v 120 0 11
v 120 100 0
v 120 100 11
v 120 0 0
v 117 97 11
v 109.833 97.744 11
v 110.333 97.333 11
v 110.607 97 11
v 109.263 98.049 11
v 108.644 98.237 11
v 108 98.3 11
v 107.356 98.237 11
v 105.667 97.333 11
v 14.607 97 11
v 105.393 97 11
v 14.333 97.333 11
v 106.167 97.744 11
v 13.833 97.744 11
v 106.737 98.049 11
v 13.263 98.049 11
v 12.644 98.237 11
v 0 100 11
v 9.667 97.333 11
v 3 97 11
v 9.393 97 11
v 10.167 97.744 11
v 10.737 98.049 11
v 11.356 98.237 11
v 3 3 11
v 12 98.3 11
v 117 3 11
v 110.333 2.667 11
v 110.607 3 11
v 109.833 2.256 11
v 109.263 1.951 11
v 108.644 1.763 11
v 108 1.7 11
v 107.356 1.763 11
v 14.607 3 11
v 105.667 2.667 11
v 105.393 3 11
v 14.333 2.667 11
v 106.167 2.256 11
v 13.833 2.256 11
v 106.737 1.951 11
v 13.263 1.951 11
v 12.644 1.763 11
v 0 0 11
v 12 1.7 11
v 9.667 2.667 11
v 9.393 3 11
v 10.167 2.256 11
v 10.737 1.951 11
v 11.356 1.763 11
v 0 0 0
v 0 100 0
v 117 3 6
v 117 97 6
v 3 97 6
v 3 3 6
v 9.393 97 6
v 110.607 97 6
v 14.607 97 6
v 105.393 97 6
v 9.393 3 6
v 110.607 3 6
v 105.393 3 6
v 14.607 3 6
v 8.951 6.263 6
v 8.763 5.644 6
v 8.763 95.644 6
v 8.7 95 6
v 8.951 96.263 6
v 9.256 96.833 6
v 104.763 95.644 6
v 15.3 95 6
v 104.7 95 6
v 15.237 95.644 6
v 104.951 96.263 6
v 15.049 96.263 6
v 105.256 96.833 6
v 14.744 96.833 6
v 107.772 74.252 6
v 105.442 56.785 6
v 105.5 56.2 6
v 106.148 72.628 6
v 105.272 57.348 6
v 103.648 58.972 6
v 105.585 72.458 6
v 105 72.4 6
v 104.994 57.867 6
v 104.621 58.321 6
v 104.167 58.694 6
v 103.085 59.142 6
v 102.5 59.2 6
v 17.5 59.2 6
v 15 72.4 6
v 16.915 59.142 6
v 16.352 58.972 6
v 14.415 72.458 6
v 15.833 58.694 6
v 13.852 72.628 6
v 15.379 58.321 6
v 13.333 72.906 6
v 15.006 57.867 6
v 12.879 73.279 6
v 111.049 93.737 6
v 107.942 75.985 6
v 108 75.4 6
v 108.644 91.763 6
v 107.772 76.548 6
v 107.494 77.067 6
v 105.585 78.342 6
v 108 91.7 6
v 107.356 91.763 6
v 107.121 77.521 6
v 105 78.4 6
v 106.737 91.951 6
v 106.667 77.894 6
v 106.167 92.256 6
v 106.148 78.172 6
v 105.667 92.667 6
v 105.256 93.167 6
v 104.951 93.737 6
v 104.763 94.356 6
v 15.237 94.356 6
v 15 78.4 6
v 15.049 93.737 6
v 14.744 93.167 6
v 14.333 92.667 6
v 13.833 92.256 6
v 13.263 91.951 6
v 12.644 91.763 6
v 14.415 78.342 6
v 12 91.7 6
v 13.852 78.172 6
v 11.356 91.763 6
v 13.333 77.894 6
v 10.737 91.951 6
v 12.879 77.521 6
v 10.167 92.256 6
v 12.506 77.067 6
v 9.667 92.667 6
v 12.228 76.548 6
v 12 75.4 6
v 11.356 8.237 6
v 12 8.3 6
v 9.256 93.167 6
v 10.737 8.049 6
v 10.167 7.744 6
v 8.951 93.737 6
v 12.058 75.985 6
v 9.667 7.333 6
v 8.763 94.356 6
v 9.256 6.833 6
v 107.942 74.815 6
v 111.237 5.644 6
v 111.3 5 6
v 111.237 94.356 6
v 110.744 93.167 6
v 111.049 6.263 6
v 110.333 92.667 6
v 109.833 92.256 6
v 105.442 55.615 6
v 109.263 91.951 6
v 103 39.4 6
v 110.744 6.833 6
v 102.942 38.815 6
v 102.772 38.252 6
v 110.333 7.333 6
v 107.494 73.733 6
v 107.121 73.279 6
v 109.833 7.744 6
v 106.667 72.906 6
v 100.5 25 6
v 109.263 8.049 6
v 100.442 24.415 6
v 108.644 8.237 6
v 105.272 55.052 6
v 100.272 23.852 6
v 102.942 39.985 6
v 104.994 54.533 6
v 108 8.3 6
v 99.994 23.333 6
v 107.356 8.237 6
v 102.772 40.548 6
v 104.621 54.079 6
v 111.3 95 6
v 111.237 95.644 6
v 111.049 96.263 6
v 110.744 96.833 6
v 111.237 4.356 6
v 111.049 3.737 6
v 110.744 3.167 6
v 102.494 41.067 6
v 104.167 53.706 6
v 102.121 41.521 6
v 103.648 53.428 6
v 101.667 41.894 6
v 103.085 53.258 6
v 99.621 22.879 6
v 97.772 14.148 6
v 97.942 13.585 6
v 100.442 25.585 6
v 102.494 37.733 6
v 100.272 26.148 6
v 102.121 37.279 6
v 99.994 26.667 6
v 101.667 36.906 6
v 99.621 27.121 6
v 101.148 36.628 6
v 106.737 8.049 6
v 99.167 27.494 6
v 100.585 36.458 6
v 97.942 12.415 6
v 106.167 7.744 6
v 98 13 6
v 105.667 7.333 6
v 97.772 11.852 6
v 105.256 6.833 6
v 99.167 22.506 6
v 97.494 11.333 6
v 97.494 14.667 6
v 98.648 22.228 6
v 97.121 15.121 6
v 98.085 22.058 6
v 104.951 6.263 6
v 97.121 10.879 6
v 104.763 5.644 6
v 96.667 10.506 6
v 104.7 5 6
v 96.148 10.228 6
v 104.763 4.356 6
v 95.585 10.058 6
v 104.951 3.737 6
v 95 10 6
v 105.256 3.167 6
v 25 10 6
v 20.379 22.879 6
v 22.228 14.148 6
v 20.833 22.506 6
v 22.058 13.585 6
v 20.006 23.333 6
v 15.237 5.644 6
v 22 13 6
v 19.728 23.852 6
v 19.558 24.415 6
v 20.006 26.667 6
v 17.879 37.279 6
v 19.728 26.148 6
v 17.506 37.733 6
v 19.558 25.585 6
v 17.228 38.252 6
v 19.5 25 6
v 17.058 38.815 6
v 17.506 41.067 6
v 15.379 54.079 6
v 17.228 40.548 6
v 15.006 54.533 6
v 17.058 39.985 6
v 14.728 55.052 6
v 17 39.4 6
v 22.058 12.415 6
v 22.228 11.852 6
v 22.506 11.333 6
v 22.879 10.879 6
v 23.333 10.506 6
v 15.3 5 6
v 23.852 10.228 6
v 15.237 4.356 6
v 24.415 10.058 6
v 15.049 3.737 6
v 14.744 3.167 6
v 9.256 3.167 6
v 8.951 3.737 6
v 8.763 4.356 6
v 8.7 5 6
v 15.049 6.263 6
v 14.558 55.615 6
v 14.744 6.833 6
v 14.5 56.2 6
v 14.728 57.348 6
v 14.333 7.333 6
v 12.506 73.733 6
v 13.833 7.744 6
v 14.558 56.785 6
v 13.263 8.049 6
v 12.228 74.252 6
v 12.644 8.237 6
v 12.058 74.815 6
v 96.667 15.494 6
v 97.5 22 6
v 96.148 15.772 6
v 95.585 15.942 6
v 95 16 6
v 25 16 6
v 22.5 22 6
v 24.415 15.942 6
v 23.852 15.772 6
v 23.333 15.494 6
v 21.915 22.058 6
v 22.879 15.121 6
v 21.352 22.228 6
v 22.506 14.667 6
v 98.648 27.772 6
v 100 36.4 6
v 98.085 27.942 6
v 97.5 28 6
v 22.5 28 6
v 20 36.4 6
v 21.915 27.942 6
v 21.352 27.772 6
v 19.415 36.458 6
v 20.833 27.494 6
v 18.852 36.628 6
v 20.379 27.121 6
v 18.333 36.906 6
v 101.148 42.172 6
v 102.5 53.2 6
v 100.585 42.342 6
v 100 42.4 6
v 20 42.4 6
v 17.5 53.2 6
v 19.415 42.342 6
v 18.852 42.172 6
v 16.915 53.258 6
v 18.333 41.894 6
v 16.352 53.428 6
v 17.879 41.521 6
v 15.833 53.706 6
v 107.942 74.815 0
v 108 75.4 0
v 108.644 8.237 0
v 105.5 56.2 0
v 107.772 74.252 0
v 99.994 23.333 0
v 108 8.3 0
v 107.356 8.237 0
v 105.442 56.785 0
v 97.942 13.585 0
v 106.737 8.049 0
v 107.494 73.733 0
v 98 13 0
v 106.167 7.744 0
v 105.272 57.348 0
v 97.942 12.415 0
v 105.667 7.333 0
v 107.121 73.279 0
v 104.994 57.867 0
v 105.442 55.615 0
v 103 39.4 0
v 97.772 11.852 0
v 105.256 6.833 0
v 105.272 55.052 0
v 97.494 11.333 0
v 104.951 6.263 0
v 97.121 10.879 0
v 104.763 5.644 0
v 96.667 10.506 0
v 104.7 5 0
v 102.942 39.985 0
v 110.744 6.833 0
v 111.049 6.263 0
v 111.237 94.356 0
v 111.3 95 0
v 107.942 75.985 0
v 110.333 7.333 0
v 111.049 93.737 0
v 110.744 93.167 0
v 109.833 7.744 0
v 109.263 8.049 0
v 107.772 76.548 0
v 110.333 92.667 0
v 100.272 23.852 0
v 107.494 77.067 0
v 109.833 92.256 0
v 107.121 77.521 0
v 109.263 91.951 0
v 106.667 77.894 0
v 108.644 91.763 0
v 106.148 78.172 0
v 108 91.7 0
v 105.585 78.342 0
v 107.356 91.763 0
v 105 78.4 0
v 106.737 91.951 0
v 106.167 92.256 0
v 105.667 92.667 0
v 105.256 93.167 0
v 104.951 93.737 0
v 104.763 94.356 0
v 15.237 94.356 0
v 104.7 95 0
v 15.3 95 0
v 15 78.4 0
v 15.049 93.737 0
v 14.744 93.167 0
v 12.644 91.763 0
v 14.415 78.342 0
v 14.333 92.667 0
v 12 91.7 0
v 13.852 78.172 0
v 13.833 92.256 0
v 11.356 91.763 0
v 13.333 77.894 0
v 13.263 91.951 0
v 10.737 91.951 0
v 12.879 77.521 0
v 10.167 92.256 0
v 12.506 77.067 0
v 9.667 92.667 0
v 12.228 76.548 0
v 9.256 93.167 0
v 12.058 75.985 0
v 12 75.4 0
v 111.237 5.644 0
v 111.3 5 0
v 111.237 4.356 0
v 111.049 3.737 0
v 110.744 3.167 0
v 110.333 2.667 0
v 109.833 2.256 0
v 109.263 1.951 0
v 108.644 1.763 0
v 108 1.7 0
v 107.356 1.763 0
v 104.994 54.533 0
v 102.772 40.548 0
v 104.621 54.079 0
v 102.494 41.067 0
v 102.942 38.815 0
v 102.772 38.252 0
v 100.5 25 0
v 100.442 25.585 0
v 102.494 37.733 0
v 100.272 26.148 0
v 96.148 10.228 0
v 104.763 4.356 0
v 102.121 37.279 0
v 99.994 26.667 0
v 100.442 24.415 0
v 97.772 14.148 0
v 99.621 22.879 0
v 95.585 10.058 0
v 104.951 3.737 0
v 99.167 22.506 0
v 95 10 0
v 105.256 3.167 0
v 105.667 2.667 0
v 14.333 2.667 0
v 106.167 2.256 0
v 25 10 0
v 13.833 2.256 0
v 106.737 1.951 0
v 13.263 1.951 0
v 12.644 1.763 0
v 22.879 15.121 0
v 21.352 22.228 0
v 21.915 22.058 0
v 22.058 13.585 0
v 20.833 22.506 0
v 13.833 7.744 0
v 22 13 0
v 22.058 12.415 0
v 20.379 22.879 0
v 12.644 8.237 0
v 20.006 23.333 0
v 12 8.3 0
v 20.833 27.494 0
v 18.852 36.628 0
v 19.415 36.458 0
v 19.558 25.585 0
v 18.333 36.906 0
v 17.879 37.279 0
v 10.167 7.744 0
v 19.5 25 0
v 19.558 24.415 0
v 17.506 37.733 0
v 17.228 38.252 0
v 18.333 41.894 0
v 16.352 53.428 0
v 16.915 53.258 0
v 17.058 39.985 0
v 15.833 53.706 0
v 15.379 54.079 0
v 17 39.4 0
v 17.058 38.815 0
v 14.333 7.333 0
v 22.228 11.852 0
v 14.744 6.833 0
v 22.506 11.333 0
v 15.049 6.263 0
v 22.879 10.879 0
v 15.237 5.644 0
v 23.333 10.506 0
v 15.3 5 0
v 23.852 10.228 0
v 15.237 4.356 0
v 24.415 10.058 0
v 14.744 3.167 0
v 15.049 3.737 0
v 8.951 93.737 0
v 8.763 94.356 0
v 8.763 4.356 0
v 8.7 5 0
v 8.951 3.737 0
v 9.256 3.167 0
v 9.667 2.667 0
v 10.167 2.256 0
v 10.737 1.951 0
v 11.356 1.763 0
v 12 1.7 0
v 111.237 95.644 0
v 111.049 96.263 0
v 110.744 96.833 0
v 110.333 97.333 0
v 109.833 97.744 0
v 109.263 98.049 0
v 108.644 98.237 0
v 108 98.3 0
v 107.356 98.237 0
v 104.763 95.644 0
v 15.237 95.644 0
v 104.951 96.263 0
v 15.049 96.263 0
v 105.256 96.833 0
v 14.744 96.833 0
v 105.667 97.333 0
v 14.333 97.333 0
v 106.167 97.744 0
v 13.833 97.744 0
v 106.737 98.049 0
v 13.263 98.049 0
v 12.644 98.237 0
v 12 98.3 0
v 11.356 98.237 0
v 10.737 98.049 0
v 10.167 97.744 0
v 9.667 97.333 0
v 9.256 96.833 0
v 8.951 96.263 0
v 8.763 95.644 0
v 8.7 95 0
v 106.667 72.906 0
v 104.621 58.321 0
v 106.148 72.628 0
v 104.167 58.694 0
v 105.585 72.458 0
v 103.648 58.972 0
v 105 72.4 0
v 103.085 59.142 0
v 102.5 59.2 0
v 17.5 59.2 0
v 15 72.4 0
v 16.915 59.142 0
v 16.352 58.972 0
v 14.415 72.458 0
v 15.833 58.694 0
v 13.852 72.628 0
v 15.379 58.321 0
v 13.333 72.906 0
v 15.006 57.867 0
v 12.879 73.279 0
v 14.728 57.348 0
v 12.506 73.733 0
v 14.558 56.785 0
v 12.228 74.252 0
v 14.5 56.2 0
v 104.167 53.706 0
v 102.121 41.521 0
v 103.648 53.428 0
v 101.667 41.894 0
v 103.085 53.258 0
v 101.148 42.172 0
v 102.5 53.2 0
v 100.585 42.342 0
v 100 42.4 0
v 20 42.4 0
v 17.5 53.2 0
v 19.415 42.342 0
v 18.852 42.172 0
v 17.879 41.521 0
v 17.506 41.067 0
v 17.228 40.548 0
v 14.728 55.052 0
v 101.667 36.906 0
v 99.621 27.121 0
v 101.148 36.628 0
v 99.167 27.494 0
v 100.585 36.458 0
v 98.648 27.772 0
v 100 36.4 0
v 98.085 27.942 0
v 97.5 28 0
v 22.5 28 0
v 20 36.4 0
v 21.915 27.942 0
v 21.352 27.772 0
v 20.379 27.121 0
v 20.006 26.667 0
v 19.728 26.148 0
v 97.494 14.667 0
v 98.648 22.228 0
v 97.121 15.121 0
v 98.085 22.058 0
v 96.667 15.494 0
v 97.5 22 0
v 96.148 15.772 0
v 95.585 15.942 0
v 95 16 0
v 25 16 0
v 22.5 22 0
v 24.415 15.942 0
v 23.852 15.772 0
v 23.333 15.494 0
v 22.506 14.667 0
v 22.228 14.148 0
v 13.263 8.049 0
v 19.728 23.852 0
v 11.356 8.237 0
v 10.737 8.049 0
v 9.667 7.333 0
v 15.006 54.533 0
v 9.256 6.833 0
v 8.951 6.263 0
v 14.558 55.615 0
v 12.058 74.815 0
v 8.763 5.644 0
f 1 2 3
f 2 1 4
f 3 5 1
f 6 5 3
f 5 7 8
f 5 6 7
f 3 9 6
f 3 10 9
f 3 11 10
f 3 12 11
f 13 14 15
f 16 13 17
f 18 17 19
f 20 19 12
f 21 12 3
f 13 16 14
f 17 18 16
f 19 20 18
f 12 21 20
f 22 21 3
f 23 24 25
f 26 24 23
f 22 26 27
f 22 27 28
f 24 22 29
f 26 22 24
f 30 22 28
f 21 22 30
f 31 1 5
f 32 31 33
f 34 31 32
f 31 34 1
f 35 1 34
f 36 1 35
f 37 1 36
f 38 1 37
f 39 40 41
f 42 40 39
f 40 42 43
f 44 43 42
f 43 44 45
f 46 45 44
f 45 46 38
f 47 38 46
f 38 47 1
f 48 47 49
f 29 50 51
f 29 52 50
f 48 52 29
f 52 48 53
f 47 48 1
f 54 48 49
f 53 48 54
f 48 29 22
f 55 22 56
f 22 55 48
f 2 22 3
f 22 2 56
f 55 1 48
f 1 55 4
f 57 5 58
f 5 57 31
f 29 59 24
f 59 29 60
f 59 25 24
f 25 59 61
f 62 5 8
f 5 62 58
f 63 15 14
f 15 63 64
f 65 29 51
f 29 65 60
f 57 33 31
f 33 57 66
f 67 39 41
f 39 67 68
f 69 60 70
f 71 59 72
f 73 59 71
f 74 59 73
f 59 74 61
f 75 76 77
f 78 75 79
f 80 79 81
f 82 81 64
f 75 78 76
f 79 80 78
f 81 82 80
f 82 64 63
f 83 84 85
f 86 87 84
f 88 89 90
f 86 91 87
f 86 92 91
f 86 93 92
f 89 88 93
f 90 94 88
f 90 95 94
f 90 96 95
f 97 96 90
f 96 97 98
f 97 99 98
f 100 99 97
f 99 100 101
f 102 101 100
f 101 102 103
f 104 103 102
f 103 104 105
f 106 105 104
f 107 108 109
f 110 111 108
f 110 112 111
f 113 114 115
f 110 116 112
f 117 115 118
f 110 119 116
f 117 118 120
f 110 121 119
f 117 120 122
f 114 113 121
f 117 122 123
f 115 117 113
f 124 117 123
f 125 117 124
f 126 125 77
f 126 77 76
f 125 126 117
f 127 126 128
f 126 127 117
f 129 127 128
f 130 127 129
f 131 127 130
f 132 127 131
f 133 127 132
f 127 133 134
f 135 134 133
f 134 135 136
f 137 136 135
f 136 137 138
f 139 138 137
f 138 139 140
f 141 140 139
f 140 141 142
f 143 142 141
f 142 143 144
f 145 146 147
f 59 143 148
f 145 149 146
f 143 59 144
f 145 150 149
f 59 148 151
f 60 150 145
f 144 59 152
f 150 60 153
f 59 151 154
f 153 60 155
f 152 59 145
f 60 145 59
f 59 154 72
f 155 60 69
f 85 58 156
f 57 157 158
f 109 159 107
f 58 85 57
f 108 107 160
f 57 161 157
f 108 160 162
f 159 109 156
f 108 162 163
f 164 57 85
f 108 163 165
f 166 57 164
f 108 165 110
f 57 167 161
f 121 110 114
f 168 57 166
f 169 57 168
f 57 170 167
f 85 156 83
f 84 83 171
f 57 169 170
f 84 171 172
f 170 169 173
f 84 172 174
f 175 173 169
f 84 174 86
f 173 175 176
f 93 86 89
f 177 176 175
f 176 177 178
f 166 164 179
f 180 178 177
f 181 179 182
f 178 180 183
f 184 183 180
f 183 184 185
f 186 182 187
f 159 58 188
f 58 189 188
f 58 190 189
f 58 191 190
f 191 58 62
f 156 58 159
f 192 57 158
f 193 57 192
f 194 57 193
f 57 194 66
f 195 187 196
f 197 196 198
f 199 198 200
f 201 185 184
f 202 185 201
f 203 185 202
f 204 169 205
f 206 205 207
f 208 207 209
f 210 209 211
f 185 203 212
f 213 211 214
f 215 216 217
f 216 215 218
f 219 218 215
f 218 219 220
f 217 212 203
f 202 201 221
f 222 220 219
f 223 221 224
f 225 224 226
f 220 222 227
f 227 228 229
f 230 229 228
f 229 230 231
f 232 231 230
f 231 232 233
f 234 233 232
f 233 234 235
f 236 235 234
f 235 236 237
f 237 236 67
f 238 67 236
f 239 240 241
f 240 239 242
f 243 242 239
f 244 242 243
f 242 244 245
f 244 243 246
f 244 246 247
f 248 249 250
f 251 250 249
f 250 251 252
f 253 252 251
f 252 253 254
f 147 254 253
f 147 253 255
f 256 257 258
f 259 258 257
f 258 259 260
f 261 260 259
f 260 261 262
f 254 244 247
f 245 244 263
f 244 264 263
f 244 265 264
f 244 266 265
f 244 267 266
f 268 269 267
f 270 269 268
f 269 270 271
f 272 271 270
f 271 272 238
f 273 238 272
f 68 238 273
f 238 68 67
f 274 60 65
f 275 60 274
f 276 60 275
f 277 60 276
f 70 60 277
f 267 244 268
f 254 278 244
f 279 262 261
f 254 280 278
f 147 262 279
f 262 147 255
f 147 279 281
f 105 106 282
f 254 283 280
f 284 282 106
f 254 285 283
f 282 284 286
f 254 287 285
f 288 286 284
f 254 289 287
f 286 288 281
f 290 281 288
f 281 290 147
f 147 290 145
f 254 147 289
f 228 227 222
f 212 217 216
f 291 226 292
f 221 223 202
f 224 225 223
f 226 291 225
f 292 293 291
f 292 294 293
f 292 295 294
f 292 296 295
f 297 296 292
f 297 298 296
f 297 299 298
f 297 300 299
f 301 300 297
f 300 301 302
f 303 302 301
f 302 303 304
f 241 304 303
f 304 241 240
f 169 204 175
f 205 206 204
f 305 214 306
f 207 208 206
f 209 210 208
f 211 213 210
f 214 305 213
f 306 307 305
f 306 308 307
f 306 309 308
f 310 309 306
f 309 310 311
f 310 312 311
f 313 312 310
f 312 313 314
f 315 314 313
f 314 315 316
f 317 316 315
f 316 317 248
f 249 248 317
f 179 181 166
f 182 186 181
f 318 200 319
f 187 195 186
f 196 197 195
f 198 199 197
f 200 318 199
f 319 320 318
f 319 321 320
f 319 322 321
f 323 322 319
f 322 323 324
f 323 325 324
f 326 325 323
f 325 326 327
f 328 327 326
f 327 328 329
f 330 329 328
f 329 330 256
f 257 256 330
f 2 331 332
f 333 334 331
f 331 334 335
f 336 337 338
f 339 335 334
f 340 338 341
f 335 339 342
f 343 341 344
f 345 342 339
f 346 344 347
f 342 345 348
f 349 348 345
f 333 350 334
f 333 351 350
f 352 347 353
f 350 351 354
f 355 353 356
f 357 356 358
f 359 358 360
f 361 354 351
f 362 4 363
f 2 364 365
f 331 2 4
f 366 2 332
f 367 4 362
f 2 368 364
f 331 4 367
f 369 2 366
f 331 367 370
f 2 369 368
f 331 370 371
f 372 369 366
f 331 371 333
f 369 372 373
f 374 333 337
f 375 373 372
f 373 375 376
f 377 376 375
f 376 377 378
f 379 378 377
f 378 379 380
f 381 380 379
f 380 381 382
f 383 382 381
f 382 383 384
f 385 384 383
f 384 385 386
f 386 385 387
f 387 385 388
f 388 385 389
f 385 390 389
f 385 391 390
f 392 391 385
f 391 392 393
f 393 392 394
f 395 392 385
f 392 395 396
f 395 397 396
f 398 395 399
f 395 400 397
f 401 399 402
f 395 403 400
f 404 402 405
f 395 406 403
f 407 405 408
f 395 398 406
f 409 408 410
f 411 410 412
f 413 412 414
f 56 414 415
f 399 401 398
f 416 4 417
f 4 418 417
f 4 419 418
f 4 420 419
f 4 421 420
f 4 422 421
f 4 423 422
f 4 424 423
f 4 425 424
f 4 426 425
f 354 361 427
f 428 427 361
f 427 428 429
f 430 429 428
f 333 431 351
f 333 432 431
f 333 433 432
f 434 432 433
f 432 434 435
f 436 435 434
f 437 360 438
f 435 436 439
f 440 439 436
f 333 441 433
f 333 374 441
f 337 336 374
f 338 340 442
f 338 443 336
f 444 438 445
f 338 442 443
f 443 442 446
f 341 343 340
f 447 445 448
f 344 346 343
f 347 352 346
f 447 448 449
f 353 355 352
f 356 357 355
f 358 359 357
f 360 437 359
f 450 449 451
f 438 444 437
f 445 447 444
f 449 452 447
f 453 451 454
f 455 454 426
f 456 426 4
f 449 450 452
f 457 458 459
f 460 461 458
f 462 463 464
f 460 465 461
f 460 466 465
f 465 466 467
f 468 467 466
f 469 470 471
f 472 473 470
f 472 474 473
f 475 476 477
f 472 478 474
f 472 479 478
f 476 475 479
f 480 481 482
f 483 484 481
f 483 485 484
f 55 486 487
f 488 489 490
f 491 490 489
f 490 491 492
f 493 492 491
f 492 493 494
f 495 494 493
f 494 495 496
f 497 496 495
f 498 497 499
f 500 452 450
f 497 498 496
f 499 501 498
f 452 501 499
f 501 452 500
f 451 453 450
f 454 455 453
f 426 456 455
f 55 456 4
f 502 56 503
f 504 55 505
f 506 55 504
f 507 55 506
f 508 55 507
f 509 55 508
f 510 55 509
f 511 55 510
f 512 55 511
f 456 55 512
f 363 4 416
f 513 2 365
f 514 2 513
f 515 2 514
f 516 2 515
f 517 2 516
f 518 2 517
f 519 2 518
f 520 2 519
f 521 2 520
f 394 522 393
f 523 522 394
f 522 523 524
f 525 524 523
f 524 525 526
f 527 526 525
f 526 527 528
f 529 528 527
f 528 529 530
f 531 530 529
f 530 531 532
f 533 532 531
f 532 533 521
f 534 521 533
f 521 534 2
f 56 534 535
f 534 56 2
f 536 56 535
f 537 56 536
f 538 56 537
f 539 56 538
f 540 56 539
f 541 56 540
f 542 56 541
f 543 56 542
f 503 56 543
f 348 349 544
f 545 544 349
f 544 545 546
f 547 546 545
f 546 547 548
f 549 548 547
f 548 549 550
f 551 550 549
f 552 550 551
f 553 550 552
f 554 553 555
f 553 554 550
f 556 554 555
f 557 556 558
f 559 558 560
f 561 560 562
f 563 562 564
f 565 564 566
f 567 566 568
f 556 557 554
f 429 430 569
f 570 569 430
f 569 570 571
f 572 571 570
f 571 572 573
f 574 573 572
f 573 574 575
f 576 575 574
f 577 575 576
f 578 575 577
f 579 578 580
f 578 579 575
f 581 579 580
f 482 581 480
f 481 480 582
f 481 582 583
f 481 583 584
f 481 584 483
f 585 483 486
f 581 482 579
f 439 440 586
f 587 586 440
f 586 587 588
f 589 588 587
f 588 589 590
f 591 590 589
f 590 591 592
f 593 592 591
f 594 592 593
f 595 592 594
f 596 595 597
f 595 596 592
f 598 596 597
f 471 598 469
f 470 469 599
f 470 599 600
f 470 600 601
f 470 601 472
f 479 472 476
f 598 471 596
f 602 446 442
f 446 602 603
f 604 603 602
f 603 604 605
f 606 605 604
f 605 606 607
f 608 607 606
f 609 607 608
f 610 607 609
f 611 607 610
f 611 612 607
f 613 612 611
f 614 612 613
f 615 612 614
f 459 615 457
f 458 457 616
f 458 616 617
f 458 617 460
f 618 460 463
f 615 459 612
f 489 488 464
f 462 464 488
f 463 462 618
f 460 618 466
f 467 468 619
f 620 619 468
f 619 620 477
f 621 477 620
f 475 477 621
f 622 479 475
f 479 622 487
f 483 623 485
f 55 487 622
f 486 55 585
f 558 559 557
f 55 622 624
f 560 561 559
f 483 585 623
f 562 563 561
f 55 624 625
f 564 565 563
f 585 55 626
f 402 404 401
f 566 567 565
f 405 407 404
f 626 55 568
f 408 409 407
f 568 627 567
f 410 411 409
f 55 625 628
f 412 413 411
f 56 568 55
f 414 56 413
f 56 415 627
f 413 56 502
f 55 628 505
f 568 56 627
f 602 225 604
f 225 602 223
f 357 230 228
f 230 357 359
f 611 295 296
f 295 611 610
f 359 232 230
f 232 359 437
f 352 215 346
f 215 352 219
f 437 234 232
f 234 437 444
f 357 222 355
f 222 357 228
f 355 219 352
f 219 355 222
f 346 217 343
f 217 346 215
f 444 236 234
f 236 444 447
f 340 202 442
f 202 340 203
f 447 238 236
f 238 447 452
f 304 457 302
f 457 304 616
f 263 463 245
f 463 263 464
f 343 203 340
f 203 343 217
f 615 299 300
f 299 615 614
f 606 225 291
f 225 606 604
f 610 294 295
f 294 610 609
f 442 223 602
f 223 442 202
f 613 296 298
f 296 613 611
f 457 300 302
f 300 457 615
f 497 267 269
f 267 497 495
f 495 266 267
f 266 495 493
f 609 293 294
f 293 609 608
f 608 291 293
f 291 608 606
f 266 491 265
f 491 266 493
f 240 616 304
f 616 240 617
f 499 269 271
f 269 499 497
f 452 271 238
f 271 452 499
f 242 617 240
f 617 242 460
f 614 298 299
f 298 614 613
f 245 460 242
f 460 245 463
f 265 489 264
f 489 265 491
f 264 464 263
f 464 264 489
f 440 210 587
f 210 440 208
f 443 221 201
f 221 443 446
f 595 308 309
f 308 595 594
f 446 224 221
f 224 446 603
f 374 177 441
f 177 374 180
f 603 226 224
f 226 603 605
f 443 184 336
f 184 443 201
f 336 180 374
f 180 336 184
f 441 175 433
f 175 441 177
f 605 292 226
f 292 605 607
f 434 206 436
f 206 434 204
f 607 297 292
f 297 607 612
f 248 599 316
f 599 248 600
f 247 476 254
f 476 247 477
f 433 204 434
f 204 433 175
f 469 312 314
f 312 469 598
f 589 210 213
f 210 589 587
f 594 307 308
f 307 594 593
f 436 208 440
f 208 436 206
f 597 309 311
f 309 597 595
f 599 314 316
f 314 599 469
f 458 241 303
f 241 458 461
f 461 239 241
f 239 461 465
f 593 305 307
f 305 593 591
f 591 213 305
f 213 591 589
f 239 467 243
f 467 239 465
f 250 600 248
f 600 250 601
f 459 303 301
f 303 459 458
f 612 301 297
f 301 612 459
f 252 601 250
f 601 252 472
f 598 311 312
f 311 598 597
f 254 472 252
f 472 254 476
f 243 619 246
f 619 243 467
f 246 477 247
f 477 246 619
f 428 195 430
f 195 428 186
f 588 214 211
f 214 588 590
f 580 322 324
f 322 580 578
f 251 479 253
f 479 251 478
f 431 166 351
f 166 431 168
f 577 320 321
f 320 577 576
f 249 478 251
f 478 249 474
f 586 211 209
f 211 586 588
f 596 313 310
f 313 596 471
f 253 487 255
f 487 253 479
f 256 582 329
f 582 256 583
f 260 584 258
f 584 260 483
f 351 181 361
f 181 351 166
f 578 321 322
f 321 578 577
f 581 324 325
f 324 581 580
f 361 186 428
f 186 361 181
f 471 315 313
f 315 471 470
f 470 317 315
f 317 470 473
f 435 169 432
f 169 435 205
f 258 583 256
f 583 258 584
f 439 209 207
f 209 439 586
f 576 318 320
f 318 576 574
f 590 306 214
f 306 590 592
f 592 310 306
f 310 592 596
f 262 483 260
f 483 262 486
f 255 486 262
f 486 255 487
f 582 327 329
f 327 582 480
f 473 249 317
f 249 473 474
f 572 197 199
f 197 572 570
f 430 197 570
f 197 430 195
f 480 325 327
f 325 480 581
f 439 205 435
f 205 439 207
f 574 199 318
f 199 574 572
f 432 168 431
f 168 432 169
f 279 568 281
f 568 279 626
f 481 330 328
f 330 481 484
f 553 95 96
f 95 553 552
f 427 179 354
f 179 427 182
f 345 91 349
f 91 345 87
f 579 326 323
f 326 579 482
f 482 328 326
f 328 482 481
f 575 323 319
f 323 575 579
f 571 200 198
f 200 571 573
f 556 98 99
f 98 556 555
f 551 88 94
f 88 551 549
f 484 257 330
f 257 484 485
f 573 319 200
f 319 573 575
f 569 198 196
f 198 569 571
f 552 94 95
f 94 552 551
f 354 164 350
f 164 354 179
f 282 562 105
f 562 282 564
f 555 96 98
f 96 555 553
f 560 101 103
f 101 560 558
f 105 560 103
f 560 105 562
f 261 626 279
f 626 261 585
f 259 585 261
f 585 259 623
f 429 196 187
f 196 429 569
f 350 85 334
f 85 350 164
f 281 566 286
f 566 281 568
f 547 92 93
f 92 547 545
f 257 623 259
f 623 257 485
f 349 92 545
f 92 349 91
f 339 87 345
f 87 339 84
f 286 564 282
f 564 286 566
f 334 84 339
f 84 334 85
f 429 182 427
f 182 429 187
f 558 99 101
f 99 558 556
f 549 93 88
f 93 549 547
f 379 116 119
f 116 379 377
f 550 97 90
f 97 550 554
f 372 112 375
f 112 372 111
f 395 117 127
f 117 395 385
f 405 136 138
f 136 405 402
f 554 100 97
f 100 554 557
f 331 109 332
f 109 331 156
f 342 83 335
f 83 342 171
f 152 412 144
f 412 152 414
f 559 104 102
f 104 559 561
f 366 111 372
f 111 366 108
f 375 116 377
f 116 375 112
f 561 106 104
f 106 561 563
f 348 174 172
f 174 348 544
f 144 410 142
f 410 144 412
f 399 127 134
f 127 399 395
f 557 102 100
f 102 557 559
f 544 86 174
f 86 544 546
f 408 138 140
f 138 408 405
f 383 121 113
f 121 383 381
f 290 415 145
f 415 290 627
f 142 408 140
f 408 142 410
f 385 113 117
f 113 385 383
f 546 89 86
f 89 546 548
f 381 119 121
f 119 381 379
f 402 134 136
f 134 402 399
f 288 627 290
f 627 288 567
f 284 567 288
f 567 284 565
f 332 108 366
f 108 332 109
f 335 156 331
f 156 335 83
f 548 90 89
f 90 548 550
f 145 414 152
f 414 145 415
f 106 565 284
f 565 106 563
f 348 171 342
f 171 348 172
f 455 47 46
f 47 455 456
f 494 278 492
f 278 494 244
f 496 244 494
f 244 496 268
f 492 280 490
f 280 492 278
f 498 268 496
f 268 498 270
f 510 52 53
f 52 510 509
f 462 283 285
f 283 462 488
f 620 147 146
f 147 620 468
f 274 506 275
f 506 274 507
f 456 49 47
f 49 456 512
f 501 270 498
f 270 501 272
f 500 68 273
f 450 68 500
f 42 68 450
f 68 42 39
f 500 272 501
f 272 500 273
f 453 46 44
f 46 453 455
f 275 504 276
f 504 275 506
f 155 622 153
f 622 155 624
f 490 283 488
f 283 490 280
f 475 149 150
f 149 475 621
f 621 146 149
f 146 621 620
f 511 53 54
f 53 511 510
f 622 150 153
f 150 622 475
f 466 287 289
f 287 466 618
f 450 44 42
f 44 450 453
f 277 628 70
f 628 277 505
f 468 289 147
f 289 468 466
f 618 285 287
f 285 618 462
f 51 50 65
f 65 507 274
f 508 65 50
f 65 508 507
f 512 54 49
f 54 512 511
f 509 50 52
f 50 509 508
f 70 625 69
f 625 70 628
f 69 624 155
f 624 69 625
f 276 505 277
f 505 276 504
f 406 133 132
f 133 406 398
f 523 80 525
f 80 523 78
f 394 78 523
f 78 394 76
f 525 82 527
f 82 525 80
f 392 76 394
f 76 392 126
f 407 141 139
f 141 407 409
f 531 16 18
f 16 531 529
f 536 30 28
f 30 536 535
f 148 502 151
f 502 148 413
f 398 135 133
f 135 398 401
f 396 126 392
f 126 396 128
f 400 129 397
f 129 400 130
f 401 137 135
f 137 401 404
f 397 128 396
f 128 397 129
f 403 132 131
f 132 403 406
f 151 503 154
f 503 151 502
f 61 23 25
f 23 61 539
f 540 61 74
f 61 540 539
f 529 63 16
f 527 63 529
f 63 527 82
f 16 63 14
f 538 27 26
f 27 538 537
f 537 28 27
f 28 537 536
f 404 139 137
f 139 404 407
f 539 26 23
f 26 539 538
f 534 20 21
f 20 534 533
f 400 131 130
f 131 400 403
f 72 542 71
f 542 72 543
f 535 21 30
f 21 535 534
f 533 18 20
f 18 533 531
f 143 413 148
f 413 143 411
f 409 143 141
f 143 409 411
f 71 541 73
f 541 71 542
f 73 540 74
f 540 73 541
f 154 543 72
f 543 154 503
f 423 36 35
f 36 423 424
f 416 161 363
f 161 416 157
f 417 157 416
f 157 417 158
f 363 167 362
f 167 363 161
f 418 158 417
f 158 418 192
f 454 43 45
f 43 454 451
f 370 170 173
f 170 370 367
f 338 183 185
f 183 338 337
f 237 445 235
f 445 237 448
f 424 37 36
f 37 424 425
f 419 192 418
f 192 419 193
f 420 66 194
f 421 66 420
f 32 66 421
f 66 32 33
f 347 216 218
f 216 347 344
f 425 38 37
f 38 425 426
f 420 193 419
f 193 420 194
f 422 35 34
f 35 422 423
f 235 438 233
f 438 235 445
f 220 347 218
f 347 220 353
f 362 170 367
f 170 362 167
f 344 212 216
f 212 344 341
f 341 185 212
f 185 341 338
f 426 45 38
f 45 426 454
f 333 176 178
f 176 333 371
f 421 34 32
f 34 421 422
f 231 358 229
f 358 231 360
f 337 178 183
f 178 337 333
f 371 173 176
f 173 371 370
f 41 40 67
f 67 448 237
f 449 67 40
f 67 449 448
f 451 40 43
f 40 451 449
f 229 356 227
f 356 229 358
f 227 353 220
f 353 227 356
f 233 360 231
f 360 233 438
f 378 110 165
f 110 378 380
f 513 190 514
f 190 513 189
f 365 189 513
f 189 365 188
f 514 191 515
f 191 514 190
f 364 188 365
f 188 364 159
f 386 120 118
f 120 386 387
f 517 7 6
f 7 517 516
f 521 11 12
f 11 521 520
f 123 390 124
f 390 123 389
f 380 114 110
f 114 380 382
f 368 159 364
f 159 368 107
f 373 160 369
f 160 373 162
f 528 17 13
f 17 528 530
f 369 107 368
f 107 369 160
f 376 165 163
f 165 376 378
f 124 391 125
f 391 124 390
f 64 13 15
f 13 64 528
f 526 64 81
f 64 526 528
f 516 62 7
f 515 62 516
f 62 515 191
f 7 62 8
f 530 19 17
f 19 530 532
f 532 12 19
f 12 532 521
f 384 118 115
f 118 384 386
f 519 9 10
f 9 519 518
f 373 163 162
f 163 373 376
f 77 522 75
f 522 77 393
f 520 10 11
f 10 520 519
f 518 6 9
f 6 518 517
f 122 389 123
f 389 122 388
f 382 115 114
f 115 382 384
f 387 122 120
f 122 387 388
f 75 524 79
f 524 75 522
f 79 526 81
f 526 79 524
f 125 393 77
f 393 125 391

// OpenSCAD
$fn = 32;

// ----------------------------------------------------------------------
// Slotted panel: 120 x 100 mm, 5 рядов of slots
// ----------------------------------------------------------------------

// --- parameters (mm) ---
panel_w = 120;            // panel width
panel_d = 100;            // panel depth
thick = 6;                // panel thickness
slot_w = 6;               // slot width
pitch0 = 12;              // first row pitch
pitch_step = 2.4;         // pitch increase per row
margin = 10;              // margin around the slot field
rows = 5;                 // number of slot rows
mount_d = 6.6;            // mounting holes
mount_x = 48;             // mounting hole offset
rim_h = 11;               // rim height
rim_t = 3;                // rim wall thickness

difference() {
  union() {
    cube([panel_w, panel_d, thick]);
    translate([0, 0, thick - 1]) difference() {
      cube([panel_w, panel_d, rim_h - thick + 1]);
      translate([rim_t, rim_t, -2.5]) cube([panel_w - 2 * rim_t, panel_d - 2 * rim_t, rim_h - thick + 6]);
    }
  }
  /* slot rows: stadium shaped cutters, 2.5 mm clear of both faces */
  /* row 0: pitch 12, length 70 */
  hull() {
    translate([25, 13, -2.5]) cylinder(h = thick + 5, d = slot_w);
    translate([95, 13, -2.5]) cylinder(h = thick + 5, d = slot_w);
  }
  /* row 1: pitch 14.4, length 75 */
  hull() {
    translate([22.5, 25, -2.5]) cylinder(h = thick + 5, d = slot_w);
    translate([97.5, 25, -2.5]) cylinder(h = thick + 5, d = slot_w);
  }
  /* row 2: pitch 16.8, length 80 */
  hull() {
    translate([20, 39.4, -2.5]) cylinder(h = thick + 5, d = slot_w);
    translate([100, 39.4, -2.5]) cylinder(h = thick + 5, d = slot_w);
  }
  /* row 3: pitch 19.2, length 85 */
  hull() {
    translate([17.5, 56.2, -2.5]) cylinder(h = thick + 5, d = slot_w);
    translate([102.5, 56.2, -2.5]) cylinder(h = thick + 5, d = slot_w);
  }
  /* row 4: pitch 21.6, length 90 */
  hull() {
    translate([15, 75.4, -2.5]) cylinder(h = thick + 5, d = slot_w);
    translate([105, 75.4, -2.5]) cylinder(h = thick + 5, d = slot_w);
  }
  translate([12, 5, -2.5]) cylinder(h = 16, d = mount_d);
  translate([12, 95, -2.5]) cylinder(h = 16, d = mount_d);
  translate([108, 5, -2.5]) cylinder(h = 16, d = mount_d);
  translate([108, 95, -2.5]) cylinder(h = 16, d = mount_d);
}
